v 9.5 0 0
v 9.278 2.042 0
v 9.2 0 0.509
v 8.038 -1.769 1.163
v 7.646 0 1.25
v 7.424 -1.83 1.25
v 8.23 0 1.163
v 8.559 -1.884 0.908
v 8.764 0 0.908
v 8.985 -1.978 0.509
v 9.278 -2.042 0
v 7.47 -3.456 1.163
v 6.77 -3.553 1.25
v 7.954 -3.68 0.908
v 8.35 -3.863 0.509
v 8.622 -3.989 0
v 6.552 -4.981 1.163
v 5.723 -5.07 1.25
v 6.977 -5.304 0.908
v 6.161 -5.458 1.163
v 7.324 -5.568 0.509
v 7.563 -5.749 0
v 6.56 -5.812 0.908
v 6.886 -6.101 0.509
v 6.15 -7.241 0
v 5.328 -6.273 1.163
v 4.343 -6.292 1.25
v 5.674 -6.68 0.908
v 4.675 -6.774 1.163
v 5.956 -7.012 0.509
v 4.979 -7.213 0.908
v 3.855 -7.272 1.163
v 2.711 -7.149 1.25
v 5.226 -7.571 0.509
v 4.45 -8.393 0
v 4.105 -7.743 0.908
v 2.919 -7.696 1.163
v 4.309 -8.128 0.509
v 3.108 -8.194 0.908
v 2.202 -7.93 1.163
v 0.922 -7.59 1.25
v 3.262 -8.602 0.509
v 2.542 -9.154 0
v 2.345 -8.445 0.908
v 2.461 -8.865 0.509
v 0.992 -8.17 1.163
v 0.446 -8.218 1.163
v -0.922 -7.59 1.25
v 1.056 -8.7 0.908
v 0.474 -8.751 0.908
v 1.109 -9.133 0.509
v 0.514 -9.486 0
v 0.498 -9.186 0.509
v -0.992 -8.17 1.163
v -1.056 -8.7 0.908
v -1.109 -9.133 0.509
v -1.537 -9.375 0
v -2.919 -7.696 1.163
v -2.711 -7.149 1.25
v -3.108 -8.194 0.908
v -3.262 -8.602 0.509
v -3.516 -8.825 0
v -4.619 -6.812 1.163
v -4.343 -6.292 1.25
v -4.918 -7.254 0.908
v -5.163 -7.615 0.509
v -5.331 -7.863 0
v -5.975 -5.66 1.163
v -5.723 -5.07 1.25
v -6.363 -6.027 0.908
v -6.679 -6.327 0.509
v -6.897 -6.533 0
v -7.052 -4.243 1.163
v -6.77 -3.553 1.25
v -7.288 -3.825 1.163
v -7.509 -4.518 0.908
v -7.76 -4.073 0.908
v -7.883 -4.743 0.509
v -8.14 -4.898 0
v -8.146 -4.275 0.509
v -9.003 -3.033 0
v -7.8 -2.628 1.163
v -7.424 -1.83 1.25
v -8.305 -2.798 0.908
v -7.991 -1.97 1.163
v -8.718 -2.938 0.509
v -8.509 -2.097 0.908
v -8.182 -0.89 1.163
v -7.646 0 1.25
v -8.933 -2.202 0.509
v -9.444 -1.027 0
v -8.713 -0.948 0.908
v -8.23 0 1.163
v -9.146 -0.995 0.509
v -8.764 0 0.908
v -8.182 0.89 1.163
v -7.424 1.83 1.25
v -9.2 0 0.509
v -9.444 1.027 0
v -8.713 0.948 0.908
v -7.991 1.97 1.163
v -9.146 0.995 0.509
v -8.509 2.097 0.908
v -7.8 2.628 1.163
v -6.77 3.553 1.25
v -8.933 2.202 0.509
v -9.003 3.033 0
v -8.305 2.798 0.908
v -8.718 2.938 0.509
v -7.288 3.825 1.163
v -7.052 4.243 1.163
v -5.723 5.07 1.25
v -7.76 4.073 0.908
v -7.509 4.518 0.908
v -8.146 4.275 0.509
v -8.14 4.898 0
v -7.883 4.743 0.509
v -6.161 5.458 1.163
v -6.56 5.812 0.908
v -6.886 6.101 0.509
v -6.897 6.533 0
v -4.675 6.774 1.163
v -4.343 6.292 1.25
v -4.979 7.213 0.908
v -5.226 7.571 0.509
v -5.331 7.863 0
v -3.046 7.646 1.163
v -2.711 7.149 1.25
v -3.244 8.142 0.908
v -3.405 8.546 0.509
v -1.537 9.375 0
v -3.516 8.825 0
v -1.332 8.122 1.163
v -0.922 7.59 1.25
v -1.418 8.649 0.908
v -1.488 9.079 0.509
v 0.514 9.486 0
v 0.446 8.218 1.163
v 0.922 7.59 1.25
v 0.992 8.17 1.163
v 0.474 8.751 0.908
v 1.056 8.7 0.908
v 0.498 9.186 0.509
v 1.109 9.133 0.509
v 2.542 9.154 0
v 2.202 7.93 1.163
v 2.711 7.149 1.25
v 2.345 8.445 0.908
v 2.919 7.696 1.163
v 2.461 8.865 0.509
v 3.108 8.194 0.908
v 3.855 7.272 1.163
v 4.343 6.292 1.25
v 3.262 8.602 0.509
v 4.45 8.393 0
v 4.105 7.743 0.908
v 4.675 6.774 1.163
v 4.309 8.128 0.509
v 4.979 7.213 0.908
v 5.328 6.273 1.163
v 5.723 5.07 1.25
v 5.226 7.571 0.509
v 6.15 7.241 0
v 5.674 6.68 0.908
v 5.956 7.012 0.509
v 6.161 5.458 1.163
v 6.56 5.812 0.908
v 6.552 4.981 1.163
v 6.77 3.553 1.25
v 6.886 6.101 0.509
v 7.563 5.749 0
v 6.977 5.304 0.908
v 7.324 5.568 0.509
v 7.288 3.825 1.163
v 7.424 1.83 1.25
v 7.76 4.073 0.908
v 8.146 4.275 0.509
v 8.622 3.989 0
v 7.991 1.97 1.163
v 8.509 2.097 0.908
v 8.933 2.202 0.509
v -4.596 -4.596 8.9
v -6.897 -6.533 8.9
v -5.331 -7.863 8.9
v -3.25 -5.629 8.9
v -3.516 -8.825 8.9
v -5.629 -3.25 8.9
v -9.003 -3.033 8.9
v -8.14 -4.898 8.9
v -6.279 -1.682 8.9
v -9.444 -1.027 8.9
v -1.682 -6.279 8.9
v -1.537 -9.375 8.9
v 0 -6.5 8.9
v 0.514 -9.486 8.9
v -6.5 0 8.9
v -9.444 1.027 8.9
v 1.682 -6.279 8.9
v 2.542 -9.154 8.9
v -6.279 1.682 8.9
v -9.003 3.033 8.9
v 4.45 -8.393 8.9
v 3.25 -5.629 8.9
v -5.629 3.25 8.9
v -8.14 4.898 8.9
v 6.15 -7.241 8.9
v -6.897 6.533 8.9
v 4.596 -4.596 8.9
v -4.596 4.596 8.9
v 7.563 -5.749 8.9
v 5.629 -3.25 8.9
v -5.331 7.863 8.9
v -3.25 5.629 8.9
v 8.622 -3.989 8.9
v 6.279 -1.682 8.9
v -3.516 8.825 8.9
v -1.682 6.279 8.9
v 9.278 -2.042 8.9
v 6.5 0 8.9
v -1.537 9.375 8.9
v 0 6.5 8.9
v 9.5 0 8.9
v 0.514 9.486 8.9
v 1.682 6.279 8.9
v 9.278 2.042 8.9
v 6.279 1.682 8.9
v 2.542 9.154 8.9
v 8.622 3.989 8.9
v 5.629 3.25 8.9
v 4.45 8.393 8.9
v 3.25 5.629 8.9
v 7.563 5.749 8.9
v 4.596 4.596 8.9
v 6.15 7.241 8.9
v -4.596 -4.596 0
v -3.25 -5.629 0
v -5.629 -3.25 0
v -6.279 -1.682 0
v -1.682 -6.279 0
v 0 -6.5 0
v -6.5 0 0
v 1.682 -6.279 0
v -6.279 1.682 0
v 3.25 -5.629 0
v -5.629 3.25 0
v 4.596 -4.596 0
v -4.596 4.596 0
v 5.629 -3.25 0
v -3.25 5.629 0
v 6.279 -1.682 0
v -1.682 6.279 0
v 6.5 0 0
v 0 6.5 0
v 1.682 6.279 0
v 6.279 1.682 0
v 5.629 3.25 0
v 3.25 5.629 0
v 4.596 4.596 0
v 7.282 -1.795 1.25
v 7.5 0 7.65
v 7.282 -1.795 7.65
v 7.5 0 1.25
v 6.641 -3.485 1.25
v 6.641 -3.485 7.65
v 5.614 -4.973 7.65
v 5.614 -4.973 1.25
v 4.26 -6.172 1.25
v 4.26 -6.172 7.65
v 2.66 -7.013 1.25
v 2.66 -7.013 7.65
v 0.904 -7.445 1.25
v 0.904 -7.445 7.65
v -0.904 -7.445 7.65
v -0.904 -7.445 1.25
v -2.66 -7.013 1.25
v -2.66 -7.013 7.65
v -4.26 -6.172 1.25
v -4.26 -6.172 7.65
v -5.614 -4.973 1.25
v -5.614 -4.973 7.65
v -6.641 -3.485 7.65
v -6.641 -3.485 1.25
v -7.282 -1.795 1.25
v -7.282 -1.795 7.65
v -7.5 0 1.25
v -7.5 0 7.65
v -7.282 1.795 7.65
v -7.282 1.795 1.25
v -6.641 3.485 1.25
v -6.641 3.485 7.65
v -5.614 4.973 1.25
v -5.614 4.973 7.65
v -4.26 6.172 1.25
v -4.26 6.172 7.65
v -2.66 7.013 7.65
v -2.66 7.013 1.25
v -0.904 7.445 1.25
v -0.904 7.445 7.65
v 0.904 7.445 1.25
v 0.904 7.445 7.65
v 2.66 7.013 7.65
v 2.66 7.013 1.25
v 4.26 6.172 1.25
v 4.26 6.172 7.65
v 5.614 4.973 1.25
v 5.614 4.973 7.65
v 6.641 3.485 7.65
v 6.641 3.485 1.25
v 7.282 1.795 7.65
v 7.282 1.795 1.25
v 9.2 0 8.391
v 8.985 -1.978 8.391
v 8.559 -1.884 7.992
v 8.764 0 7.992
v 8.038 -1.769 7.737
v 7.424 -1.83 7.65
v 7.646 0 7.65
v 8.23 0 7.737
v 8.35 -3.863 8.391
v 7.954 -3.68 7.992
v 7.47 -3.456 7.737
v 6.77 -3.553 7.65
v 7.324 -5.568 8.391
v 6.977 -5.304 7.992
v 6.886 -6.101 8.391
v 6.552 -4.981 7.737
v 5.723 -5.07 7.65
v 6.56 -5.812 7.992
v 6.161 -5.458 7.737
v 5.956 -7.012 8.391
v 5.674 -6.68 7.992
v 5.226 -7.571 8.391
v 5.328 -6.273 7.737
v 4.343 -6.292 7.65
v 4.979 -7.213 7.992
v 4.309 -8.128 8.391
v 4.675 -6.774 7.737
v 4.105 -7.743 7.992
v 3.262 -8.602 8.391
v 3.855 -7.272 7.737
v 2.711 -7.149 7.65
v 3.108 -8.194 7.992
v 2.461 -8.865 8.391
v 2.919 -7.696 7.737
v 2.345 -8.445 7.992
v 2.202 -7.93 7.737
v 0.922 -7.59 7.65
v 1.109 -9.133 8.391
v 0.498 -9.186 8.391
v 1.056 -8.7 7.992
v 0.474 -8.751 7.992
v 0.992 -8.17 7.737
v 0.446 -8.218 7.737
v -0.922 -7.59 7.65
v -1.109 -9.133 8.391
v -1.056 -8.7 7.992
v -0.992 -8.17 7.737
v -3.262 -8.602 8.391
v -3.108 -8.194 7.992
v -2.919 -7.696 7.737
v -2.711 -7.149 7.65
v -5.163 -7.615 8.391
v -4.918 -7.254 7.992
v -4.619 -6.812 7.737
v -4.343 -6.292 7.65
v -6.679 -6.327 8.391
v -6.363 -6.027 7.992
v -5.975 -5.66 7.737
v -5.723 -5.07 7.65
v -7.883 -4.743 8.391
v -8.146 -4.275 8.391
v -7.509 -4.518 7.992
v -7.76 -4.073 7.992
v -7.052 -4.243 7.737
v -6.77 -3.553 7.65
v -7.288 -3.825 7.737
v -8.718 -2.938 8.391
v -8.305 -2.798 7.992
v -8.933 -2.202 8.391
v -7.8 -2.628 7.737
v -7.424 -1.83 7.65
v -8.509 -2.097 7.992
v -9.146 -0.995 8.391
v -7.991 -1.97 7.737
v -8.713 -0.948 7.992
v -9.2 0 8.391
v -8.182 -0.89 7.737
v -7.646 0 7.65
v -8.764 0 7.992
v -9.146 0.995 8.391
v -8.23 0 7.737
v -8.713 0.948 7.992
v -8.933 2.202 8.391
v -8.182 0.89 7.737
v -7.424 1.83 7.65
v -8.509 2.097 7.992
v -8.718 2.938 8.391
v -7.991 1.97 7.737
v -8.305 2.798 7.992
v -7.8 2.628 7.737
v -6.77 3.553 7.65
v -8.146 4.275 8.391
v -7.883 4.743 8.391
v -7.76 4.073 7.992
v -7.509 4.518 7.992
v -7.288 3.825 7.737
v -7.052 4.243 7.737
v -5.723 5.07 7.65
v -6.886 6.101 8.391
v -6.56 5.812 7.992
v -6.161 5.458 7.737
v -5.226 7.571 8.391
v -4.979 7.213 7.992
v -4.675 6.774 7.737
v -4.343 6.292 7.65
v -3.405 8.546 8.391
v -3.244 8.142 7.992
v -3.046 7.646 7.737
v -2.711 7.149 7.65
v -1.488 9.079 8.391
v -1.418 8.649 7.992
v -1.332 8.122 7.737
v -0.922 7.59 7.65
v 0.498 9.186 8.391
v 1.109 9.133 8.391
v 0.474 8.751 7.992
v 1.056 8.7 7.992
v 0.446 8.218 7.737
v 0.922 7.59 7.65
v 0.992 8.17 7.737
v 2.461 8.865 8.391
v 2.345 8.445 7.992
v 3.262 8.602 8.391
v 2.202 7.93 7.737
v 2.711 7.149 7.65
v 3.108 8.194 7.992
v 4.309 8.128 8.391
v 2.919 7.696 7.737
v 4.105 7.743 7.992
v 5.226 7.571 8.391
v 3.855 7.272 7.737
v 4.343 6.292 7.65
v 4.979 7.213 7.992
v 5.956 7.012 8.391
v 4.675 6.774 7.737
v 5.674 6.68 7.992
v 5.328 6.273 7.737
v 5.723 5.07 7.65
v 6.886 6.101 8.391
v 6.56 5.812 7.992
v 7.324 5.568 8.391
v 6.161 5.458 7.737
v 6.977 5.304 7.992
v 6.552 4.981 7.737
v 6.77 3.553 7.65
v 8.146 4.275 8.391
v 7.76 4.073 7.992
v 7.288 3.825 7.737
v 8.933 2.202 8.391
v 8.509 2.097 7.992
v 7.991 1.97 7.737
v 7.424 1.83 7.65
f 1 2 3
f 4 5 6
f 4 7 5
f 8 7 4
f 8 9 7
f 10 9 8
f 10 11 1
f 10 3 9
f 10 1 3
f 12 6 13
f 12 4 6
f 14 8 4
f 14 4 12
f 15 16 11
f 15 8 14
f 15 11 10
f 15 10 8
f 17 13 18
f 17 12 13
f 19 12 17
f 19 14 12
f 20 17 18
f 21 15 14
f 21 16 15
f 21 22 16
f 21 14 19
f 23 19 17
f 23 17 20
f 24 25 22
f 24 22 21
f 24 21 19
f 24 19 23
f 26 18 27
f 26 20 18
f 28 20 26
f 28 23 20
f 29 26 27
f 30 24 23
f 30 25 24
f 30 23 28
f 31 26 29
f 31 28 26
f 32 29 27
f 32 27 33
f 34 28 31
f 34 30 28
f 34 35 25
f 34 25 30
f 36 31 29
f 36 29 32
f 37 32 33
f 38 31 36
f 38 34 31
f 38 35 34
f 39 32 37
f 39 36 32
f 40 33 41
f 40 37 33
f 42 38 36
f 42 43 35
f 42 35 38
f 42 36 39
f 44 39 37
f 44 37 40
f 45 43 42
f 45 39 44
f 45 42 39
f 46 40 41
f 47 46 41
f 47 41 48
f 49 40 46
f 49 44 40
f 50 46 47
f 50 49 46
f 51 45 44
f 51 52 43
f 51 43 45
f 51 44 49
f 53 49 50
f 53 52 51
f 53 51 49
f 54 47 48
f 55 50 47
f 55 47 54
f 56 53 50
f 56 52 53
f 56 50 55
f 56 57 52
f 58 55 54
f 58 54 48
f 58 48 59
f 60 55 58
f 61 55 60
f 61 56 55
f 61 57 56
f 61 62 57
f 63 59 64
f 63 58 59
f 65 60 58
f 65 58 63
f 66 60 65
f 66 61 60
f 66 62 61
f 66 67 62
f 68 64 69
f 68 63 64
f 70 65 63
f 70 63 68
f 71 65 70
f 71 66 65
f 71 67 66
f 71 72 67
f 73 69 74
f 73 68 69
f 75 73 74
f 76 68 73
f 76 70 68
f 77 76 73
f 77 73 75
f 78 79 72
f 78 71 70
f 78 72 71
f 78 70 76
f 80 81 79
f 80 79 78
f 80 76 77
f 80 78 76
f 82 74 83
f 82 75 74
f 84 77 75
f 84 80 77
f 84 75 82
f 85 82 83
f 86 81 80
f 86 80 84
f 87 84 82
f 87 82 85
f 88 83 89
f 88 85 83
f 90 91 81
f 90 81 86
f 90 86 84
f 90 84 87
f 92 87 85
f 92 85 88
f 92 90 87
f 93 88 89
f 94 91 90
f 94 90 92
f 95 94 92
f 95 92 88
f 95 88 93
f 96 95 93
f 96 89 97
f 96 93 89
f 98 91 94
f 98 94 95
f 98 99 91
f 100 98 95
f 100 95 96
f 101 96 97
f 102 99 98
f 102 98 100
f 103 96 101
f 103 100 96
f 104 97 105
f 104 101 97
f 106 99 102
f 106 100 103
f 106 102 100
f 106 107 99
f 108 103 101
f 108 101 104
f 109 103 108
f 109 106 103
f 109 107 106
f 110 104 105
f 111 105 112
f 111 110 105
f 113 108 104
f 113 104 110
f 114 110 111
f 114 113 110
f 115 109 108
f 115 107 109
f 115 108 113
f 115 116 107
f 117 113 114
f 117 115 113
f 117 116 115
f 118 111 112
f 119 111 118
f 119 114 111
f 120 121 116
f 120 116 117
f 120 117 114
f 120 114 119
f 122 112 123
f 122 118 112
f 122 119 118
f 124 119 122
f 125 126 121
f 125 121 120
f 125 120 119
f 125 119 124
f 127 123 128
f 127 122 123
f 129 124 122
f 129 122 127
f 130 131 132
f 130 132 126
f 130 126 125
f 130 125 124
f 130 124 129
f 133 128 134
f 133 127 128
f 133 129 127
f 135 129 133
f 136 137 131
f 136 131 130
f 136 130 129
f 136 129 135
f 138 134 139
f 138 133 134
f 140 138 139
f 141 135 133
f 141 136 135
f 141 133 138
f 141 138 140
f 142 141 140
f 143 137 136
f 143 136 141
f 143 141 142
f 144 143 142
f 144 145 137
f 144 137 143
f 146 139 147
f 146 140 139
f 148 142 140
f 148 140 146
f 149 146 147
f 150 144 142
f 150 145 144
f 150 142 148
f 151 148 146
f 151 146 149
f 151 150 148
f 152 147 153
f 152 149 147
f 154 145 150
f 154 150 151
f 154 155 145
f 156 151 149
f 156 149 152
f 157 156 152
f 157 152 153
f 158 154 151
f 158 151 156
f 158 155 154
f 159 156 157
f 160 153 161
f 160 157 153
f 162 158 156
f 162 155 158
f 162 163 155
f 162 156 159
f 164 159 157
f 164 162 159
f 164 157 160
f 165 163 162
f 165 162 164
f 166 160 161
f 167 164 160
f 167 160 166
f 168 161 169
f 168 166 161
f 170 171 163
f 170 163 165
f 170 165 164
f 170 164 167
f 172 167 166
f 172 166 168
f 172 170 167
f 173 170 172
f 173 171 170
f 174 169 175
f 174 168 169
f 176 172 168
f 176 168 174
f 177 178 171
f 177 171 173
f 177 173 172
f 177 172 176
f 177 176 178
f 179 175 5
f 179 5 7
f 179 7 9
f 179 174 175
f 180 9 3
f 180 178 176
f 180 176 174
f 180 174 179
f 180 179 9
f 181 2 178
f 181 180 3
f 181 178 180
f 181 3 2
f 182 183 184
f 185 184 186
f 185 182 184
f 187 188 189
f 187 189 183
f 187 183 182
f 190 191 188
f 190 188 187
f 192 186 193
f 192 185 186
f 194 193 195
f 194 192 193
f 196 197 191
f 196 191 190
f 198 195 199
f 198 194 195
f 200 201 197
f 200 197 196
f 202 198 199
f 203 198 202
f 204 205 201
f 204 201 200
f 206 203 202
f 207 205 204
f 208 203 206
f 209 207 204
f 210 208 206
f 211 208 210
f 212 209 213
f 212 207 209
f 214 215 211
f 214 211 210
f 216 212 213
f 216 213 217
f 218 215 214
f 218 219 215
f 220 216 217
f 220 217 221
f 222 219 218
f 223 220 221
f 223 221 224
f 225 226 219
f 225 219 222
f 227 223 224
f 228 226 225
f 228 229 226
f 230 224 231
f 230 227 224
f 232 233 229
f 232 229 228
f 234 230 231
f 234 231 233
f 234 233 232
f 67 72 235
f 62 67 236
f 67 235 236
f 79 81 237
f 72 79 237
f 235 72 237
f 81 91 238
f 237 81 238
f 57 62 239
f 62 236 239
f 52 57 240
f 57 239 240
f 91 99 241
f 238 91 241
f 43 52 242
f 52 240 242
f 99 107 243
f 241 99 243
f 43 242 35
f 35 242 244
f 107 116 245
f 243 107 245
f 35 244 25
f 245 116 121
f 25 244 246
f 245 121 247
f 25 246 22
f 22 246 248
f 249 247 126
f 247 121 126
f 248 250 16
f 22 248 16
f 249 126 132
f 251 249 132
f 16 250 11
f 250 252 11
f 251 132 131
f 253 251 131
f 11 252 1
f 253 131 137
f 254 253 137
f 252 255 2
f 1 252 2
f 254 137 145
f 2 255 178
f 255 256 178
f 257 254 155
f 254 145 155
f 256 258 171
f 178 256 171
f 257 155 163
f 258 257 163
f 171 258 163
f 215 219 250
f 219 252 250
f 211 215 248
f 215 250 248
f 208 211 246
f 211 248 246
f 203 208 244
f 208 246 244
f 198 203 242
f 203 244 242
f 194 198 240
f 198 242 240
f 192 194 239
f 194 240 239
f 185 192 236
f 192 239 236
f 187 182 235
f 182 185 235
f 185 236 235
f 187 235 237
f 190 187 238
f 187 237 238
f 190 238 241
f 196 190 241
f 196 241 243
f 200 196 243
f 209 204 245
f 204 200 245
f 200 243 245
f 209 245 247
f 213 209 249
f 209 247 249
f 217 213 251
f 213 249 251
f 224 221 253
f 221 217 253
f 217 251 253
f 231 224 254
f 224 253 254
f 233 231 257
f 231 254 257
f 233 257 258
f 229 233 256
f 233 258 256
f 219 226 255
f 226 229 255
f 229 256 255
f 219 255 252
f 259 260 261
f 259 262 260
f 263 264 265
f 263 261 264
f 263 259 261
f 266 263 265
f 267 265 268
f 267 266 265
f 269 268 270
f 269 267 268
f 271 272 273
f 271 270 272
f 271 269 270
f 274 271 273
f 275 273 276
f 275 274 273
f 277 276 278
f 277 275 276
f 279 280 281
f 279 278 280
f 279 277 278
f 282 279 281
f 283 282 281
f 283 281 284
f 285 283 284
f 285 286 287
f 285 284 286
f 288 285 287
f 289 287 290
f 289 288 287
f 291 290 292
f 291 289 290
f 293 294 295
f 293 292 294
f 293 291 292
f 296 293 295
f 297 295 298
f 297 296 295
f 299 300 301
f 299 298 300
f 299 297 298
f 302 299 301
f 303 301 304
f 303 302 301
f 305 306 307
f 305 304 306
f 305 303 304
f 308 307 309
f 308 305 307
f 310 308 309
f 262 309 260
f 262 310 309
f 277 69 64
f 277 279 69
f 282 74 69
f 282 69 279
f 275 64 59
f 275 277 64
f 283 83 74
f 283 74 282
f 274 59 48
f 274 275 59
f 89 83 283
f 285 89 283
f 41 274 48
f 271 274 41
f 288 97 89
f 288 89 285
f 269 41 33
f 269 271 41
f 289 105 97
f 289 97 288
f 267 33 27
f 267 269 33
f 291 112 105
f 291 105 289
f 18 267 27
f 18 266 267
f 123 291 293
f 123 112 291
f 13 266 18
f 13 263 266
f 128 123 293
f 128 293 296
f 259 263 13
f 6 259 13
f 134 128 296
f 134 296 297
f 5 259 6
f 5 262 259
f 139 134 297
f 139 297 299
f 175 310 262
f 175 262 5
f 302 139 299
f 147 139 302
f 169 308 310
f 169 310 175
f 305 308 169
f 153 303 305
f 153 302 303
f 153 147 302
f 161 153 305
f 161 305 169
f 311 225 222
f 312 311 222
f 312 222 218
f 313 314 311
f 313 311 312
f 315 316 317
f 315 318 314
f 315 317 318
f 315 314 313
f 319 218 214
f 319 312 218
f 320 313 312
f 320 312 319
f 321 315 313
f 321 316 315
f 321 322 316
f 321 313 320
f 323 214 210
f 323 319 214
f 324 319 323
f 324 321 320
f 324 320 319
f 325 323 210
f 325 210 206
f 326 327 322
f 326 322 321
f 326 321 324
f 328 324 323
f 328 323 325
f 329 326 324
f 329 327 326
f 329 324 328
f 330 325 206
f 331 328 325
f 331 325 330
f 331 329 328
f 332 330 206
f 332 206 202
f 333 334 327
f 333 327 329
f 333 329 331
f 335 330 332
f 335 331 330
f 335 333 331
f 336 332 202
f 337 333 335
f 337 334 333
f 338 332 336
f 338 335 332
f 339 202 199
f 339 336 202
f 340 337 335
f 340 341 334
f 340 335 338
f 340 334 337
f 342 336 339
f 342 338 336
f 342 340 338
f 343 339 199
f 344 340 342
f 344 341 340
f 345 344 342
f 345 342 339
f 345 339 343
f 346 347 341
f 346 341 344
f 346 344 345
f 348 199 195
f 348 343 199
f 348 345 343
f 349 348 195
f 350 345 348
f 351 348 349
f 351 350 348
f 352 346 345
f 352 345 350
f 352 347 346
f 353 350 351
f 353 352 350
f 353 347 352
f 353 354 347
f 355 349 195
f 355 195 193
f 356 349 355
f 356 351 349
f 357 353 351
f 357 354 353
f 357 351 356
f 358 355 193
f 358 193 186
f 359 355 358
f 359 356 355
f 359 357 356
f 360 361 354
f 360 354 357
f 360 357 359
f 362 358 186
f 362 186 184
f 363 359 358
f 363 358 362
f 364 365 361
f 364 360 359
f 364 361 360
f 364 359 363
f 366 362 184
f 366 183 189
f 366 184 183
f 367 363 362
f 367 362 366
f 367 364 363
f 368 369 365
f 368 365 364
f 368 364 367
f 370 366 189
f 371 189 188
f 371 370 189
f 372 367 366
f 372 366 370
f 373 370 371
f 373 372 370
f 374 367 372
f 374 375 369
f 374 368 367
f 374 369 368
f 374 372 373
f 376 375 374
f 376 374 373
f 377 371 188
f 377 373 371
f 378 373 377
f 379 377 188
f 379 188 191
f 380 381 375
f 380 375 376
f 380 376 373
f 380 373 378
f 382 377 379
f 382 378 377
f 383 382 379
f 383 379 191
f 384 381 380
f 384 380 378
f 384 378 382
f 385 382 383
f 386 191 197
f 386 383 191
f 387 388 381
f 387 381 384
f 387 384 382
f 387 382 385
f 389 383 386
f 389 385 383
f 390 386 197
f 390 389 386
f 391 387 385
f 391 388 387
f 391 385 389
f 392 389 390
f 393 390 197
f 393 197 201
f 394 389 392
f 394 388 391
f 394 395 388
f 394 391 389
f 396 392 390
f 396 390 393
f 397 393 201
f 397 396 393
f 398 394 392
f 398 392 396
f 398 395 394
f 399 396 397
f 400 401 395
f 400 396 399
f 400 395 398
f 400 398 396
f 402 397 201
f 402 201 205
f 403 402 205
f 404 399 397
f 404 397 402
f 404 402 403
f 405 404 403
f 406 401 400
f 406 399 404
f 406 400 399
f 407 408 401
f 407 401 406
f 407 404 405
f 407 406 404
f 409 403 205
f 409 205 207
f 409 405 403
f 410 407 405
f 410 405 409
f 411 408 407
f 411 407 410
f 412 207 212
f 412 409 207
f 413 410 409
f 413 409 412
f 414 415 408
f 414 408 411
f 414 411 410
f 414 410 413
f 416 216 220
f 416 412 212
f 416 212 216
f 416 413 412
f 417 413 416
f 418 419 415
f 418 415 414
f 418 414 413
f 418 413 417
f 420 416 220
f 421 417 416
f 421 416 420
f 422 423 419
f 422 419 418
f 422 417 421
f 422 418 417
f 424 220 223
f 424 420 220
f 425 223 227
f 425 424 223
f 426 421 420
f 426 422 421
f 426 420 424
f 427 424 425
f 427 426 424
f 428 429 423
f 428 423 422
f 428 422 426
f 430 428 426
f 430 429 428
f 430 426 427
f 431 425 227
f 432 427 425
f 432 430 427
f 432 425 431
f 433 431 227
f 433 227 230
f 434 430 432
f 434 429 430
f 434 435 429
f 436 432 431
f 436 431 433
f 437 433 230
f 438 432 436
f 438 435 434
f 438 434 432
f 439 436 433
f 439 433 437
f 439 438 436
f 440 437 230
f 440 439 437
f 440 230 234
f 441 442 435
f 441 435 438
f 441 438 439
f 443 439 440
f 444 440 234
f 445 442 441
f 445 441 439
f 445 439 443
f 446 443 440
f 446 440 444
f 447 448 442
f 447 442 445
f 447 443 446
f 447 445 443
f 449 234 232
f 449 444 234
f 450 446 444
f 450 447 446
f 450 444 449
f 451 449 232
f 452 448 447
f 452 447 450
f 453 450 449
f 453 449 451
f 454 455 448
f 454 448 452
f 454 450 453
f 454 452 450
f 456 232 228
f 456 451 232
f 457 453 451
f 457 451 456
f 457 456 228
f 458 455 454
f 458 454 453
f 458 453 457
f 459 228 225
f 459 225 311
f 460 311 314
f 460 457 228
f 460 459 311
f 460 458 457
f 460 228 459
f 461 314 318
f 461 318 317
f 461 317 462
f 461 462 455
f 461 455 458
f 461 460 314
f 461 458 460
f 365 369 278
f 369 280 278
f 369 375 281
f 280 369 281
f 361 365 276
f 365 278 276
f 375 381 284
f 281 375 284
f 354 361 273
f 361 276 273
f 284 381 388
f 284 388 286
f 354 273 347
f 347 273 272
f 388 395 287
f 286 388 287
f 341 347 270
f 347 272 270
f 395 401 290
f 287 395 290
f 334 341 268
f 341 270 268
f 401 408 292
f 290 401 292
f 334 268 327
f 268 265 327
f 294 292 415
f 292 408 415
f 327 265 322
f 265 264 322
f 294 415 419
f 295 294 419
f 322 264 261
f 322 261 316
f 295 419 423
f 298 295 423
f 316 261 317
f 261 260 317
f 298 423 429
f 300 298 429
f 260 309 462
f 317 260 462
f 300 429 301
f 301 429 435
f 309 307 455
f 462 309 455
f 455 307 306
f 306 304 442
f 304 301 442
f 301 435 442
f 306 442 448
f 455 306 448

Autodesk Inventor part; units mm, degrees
ref_plane "YZ Plane" through (0, 0, 0) normal (1, 0, 0) x (0, 1, 0)
ref_plane "XZ Plane" through (0, 0, 0) normal (0, 1, 0) x (-1, 0, 0)
ref_plane "XY Plane" through (0, 0, 0) normal (0, 0, 1) x (1, 0, 0)
sketch "Skizze1" plane through (0, 0, 0) normal (0, 0, 1) x (1, 0, 0)
  circle A0 centre (0, 0) radius 6.5
  circle A1 centre (0, 0) radius 9.5
  dimension "d0" = 13
  dimension "d1" = 19
extrude "Extrusion1" add sketch "Skizze1" along normal blind 1.25
sketch "Skizze2" plane through (0, 0, 1.25) normal (0, 0, 1) x (1, 0, 0)
  circle A0 centre (0, 0) radius 6.5
  circle A1 centre (0, 0) radius 7.5
  dimension "d4" = 15
extrude "Extrusion2" add sketch "Skizze2" along normal blind 6.4
sketch "Skizze3" plane through (0, 0, 7.65) normal (0, 0, 1) x (1, 0, 0)
  circle A0 centre (0, 0) radius 6.5
  circle A1 centre (0, 0) radius 9.5
extrude "Extrusion3" add sketch "Skizze3" along normal blind 1.25
fillet "Rundung1" radius 2 2 edges at (-9.5, 0, 7.65) (-9.5, 0, 1.25)
properties part number "Prusa_pulley"
